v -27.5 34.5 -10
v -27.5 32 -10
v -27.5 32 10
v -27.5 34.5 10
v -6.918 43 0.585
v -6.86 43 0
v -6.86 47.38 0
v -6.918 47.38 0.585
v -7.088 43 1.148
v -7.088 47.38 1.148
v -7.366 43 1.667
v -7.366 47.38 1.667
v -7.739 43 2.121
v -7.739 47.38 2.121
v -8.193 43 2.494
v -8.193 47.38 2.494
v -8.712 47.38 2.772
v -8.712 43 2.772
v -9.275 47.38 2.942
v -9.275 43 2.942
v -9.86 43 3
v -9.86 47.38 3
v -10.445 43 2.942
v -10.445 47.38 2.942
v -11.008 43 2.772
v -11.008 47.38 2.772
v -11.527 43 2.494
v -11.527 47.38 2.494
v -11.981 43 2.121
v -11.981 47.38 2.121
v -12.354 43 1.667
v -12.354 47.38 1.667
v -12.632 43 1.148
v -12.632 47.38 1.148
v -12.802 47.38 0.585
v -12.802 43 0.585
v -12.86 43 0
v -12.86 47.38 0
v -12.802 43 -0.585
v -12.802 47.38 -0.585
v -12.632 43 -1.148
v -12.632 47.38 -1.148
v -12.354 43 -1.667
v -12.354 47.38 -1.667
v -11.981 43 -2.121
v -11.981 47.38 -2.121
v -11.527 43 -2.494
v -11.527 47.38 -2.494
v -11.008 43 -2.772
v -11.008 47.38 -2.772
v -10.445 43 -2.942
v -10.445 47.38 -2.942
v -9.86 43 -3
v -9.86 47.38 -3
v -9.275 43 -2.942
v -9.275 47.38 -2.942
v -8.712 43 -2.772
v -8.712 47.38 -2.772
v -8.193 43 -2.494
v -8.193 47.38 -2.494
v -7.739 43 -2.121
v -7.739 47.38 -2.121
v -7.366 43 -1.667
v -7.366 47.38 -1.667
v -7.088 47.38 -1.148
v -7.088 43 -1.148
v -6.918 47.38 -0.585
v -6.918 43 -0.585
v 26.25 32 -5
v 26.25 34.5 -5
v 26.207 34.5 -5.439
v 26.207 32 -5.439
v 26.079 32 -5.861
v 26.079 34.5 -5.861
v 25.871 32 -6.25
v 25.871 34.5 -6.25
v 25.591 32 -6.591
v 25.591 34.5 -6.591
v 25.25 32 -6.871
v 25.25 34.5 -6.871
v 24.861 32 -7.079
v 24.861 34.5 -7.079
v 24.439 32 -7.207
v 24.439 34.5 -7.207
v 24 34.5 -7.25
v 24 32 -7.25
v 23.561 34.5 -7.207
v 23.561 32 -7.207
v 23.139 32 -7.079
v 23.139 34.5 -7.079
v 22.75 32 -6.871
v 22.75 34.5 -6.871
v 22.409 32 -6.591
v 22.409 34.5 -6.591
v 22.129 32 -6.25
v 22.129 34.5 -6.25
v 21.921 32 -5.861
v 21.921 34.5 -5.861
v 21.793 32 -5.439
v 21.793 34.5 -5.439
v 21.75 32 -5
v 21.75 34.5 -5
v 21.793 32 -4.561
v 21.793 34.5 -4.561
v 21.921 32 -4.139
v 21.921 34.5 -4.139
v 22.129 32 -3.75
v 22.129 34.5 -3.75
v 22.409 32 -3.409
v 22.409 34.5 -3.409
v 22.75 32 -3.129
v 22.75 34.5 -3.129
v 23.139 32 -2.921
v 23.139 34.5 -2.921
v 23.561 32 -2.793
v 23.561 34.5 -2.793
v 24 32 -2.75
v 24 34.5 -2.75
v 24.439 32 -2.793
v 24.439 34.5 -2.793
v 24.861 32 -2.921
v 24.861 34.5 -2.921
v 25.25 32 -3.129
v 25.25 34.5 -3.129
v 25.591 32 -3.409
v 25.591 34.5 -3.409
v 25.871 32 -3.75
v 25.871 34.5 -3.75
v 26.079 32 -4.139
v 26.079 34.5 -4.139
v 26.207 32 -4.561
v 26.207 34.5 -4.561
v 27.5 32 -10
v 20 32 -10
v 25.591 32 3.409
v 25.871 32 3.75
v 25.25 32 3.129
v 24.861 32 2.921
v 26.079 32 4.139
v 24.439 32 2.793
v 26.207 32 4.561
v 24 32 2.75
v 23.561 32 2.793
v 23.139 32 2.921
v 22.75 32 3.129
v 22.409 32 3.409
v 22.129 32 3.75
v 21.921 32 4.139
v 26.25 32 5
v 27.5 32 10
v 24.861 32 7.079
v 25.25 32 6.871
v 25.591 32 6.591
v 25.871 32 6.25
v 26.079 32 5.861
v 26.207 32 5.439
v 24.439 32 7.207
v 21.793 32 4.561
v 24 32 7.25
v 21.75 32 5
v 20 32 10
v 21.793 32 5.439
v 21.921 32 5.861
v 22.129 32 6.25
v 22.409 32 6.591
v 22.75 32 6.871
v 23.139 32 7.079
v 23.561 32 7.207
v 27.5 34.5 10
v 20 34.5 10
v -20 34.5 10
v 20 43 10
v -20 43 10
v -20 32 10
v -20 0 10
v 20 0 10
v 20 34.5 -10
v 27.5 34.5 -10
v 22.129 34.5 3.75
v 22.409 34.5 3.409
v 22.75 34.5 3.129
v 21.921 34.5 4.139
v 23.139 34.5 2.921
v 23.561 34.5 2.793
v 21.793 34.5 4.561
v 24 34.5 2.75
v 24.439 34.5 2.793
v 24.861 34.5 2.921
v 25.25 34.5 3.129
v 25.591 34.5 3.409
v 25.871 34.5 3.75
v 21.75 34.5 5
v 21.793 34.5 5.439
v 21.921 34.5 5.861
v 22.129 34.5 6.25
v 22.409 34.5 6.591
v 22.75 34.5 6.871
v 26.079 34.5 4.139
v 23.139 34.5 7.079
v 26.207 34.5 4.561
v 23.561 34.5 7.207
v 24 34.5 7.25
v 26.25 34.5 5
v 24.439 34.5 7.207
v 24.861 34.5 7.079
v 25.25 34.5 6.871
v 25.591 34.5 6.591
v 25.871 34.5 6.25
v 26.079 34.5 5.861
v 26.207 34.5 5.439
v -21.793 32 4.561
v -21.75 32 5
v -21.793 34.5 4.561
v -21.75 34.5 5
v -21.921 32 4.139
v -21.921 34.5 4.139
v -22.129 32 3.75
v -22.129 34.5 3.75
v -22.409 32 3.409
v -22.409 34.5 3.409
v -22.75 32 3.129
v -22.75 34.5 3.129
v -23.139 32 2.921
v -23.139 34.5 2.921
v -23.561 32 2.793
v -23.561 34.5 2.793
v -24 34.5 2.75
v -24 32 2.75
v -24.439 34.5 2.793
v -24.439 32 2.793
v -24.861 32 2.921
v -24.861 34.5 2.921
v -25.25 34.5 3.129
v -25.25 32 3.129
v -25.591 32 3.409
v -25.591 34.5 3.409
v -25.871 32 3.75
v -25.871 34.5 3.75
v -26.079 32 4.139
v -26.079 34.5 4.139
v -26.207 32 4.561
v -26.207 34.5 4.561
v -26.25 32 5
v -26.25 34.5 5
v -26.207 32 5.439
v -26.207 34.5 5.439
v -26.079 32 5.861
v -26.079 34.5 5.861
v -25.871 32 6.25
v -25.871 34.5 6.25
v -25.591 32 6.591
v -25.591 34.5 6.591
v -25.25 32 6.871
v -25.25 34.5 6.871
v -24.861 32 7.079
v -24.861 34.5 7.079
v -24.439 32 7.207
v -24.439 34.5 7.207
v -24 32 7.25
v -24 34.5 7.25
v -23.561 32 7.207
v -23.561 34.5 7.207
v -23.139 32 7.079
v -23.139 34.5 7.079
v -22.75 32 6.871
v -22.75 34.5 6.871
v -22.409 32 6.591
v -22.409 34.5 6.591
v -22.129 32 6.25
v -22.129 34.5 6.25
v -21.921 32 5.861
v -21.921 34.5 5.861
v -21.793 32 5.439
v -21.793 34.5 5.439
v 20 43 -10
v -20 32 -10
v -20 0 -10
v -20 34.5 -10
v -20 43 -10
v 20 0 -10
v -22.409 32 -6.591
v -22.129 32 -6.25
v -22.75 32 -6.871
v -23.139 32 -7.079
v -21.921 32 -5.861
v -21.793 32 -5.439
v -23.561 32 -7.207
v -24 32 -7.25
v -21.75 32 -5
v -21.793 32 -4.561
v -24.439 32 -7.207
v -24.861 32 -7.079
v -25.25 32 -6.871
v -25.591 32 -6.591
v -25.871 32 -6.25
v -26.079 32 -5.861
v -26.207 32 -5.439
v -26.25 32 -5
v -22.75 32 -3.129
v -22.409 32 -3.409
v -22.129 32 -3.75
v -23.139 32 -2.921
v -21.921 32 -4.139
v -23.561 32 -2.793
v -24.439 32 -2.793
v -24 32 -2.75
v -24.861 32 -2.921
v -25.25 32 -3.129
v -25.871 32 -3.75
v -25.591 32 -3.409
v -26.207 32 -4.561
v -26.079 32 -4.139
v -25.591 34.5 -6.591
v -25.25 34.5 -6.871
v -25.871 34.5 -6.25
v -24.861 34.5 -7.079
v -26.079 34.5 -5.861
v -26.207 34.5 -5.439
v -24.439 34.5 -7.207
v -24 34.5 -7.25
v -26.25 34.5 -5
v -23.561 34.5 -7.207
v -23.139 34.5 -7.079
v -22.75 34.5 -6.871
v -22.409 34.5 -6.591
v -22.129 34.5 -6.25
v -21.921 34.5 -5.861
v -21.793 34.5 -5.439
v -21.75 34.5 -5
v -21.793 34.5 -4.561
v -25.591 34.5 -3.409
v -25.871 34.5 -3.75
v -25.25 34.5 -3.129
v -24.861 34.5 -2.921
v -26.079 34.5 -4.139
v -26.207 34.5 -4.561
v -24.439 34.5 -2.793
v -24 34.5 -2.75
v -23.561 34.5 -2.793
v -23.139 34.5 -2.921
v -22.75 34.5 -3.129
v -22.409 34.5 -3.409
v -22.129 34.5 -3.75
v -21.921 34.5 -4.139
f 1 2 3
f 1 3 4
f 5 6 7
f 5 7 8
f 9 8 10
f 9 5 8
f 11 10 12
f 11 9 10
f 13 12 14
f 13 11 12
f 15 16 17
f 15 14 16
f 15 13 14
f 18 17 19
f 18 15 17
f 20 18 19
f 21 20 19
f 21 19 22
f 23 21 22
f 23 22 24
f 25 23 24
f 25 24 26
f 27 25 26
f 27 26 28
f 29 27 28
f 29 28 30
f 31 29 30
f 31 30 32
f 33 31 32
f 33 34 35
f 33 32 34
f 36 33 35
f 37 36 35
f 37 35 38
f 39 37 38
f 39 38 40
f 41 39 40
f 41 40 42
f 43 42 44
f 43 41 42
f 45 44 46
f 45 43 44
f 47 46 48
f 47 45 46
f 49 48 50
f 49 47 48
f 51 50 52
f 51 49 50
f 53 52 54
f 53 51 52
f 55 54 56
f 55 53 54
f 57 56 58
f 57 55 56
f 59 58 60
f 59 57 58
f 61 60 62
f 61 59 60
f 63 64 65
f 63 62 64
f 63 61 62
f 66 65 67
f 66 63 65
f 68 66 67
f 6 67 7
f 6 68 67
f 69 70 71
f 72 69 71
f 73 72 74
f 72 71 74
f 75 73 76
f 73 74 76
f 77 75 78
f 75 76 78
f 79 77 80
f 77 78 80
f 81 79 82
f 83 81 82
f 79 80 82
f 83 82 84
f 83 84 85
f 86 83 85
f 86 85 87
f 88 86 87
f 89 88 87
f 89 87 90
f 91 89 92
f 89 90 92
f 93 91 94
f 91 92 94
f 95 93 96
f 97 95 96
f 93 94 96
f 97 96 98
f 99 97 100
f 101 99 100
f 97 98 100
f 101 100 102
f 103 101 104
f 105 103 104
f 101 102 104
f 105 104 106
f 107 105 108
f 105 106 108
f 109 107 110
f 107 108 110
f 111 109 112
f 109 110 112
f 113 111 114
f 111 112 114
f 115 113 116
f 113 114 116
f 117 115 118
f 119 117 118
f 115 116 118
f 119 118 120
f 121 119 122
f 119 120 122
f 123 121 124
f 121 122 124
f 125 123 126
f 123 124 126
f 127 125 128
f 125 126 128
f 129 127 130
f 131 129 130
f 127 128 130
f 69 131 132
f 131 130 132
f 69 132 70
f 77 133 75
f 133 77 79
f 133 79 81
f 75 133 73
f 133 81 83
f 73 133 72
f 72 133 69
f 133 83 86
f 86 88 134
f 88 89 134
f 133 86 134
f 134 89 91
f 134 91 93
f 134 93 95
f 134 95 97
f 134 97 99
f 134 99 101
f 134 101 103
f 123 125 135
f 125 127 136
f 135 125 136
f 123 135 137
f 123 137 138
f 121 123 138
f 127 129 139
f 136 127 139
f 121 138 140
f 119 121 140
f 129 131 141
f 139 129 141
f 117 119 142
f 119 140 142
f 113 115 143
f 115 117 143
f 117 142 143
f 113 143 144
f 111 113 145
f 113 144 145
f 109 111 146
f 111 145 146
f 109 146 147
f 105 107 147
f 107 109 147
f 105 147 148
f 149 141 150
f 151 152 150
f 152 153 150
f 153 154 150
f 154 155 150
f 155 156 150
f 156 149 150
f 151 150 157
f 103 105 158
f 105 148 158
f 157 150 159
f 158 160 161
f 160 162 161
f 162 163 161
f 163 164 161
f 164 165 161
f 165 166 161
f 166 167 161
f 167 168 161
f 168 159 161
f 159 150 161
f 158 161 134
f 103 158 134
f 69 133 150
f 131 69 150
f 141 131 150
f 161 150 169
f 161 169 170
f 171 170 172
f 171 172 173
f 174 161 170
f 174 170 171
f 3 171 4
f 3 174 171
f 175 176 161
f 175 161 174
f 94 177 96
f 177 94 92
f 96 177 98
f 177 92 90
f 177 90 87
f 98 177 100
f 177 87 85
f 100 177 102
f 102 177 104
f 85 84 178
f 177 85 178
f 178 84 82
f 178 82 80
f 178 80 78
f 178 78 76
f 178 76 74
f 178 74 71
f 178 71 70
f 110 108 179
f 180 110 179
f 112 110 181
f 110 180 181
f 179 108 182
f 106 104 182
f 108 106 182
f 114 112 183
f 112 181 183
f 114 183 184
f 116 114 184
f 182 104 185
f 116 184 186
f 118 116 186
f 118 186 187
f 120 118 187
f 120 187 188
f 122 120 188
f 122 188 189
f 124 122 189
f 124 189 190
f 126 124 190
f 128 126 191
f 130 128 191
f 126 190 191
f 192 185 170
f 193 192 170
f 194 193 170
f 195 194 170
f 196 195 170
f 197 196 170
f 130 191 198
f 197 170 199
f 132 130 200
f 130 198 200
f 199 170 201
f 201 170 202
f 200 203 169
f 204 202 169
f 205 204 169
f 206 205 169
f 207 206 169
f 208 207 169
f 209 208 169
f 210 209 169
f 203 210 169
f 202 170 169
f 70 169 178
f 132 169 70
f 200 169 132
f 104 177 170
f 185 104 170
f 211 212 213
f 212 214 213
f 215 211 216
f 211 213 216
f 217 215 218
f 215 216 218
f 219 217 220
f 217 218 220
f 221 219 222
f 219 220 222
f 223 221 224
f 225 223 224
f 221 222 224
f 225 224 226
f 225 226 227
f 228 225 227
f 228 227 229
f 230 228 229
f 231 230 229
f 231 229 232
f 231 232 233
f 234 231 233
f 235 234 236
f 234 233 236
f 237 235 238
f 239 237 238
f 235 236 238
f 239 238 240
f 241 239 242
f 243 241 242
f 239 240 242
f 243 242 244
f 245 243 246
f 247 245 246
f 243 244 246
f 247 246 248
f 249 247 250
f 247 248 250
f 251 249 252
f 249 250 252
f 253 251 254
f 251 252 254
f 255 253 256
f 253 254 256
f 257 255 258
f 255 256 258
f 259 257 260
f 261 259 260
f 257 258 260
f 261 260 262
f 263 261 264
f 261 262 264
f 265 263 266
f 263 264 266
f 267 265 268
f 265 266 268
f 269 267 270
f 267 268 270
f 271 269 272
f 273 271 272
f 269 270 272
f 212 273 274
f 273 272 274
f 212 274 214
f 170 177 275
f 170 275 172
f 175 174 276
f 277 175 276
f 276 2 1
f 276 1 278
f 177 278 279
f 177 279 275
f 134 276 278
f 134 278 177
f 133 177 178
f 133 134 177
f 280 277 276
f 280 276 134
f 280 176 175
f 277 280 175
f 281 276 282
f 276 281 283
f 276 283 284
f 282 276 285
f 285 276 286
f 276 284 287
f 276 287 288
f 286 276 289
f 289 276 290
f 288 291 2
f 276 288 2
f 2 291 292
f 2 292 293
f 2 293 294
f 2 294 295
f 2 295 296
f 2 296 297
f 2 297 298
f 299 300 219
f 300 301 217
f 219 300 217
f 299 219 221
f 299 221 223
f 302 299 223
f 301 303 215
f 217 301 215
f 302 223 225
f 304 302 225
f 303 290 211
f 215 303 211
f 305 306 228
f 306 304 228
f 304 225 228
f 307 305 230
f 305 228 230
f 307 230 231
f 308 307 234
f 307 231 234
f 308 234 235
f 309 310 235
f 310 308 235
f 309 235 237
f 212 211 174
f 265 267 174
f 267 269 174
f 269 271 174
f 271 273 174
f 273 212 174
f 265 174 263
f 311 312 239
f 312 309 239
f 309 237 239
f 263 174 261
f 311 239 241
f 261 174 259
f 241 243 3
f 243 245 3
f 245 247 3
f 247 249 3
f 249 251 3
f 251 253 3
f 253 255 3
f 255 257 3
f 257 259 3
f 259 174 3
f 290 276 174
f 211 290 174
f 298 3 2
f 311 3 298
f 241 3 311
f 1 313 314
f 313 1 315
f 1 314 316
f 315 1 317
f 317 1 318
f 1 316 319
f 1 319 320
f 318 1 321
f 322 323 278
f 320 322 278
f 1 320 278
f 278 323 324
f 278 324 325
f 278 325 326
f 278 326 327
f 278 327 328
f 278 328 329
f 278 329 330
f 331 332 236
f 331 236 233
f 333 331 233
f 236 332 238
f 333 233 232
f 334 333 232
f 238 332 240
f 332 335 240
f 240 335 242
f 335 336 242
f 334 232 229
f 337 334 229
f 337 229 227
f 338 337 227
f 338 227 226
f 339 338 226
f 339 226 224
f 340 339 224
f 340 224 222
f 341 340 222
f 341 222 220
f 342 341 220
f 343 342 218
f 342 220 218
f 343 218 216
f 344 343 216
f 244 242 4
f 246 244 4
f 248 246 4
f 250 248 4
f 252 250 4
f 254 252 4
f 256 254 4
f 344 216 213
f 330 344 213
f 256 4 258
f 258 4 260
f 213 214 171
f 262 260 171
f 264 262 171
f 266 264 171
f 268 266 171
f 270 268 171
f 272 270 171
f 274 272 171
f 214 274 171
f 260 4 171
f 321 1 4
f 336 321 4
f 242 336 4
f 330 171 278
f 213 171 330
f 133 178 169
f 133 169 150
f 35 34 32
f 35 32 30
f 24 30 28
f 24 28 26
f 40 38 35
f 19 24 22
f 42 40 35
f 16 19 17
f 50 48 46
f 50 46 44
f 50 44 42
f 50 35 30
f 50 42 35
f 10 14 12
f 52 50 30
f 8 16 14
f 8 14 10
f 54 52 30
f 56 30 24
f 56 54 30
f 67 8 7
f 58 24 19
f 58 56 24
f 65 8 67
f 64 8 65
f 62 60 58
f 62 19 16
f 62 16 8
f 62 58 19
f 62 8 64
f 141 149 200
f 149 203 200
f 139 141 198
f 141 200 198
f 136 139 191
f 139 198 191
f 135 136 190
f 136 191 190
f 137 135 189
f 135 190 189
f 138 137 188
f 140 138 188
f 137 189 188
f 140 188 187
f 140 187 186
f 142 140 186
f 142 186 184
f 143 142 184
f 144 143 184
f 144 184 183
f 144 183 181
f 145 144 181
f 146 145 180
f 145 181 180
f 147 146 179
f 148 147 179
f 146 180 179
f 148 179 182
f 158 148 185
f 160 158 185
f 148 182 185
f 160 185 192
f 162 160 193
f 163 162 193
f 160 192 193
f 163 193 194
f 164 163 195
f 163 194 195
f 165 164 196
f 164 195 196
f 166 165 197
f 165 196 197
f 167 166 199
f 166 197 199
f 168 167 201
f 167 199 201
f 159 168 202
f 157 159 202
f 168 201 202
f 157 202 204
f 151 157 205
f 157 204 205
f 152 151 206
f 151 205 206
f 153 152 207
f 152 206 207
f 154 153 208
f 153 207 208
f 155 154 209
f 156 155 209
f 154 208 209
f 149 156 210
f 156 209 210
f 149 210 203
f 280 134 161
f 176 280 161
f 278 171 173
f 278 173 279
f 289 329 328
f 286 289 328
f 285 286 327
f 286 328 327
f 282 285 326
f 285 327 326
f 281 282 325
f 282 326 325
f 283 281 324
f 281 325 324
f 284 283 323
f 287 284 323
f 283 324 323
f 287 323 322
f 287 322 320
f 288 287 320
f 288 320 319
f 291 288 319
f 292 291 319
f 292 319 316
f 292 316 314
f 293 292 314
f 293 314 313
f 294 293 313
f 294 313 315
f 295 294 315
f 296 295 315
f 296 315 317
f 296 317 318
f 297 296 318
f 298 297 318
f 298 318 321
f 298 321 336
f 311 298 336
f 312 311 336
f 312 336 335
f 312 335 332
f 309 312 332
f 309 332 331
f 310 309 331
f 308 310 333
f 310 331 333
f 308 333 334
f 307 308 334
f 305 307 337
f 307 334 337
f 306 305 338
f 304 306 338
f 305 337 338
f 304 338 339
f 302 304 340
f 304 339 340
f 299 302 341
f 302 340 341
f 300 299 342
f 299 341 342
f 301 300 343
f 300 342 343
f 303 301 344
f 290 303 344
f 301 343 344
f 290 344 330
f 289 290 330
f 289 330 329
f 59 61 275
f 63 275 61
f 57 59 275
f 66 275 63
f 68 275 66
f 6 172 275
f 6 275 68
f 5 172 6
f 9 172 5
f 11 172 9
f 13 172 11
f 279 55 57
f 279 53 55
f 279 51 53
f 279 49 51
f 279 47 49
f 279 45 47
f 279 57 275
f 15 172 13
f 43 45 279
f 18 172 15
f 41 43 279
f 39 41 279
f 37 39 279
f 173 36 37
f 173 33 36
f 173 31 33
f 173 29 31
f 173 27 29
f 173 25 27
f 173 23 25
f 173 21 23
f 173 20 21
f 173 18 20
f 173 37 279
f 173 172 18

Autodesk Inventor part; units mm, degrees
ref_plane "YZ Plane" through (0, 0, 0) normal (1, 0, 0) x (0, 1, 0)
ref_plane "XZ Plane" through (0, 0, 0) normal (0, 1, 0) x (-1, 0, 0)
ref_plane "XY Plane" through (0, 0, 0) normal (0, 0, 1) x (1, 0, 0)
sketch "Sketch1" plane through (0, 0, 0) normal (0, 1, 0) x (-1, 0, 0)
  line L0 (-20, 10) -> (20, 10)
  line L1 (20, 10) -> (20, -10)
  line L2 (20, -10) -> (-20, -10)
  line L3 (-20, -10) -> (-20, 10)
  line L4 (-20, 10) -> (20, -10) construction
  line L5 (20, 10) -> (-20, -10) construction
  point P0 (0, 0)
  dimension "d0" = 40
  dimension "d1" = 20
extrude "Extrusion1" add sketch "Sketch1" along normal blind 43
sketch "Sketch2" plane through (-20, 0, 10) normal (0, 0, 1) x (1, 0, 0)
  line L0 (-7.5, 34.5) -> (47.5, 34.5)
  line L1 (47.5, 34.5) -> (47.5, 32)
  line L2 (47.5, 32) -> (-7.5, 32)
  line L3 (-7.5, 32) -> (-7.5, 34.5)
  line L4 (0, 0) -> (40, 0) projected
  line L5 (0, 0) -> (0, 43) projected
  point P0 (20, 0)
  point P1 (-7.5, 33.25)
  dimension "d4" = 55
  dimension "d5" = 2.5
  dimension "d6" = 32
  dimension "d7" = 7.5
extrude "Extrusion2" add sketch "Sketch2" against normal up to surface (20 mm away)
sketch "Sketch3" plane through (-27.5, 34.5, 10) normal (0, 1, 0) x (1, 0, 0)
  line L0 (0, 0) -> (0, 20) projected
  line L1 (0, 10) -> (55, 10) construction
  line L2 (55, 0) -> (55, 20) projected
  line L3 (7.5, 0) -> (47.5, 0) projected
  line L4 (27.5, 0) -> (27.5, 20) construction
  line L5 (47.5, 20) -> (7.5, 20) projected
  circle A0 centre (3.5, 5) radius 2.25
  circle A1 centre (3.5, 15) radius 2.25
  circle A2 centre (51.5, 5) radius 2.25
  circle A3 centre (51.5, 15) radius 2.25
  point P0 (27.5, 10)
  dimension "d10" = 4.5
  dimension "d11" = 5
  dimension "d12" = 24
extrude "Extrusion3" cut sketch "Sketch3" against normal through all
sketch "Sketch4" plane through (0, 43, 0) normal (0, 1, 0) x (1, 0, 0)
  line L0 (-27.5, -10) -> (-27.5, 10) projected
  line L1 (-27.5, 0) -> (27.5, 0) construction
  line L2 (27.5, -10) -> (27.5, 10) projected
  line L3 (0, -10) -> (0, 10) construction
  line L4 (20, 10) -> (-20, 10) projected
  circle A0 centre (-9.86, 0) radius 3
  point P0 (0, 0)
  dimension "d15" = 6
  dimension "d16" = 9.86
extrude "Extrusion4" add sketch "Sketch4" along normal blind 4.38
properties part number "feetech_25kg_servo" material "Acetal Resin, Black"
